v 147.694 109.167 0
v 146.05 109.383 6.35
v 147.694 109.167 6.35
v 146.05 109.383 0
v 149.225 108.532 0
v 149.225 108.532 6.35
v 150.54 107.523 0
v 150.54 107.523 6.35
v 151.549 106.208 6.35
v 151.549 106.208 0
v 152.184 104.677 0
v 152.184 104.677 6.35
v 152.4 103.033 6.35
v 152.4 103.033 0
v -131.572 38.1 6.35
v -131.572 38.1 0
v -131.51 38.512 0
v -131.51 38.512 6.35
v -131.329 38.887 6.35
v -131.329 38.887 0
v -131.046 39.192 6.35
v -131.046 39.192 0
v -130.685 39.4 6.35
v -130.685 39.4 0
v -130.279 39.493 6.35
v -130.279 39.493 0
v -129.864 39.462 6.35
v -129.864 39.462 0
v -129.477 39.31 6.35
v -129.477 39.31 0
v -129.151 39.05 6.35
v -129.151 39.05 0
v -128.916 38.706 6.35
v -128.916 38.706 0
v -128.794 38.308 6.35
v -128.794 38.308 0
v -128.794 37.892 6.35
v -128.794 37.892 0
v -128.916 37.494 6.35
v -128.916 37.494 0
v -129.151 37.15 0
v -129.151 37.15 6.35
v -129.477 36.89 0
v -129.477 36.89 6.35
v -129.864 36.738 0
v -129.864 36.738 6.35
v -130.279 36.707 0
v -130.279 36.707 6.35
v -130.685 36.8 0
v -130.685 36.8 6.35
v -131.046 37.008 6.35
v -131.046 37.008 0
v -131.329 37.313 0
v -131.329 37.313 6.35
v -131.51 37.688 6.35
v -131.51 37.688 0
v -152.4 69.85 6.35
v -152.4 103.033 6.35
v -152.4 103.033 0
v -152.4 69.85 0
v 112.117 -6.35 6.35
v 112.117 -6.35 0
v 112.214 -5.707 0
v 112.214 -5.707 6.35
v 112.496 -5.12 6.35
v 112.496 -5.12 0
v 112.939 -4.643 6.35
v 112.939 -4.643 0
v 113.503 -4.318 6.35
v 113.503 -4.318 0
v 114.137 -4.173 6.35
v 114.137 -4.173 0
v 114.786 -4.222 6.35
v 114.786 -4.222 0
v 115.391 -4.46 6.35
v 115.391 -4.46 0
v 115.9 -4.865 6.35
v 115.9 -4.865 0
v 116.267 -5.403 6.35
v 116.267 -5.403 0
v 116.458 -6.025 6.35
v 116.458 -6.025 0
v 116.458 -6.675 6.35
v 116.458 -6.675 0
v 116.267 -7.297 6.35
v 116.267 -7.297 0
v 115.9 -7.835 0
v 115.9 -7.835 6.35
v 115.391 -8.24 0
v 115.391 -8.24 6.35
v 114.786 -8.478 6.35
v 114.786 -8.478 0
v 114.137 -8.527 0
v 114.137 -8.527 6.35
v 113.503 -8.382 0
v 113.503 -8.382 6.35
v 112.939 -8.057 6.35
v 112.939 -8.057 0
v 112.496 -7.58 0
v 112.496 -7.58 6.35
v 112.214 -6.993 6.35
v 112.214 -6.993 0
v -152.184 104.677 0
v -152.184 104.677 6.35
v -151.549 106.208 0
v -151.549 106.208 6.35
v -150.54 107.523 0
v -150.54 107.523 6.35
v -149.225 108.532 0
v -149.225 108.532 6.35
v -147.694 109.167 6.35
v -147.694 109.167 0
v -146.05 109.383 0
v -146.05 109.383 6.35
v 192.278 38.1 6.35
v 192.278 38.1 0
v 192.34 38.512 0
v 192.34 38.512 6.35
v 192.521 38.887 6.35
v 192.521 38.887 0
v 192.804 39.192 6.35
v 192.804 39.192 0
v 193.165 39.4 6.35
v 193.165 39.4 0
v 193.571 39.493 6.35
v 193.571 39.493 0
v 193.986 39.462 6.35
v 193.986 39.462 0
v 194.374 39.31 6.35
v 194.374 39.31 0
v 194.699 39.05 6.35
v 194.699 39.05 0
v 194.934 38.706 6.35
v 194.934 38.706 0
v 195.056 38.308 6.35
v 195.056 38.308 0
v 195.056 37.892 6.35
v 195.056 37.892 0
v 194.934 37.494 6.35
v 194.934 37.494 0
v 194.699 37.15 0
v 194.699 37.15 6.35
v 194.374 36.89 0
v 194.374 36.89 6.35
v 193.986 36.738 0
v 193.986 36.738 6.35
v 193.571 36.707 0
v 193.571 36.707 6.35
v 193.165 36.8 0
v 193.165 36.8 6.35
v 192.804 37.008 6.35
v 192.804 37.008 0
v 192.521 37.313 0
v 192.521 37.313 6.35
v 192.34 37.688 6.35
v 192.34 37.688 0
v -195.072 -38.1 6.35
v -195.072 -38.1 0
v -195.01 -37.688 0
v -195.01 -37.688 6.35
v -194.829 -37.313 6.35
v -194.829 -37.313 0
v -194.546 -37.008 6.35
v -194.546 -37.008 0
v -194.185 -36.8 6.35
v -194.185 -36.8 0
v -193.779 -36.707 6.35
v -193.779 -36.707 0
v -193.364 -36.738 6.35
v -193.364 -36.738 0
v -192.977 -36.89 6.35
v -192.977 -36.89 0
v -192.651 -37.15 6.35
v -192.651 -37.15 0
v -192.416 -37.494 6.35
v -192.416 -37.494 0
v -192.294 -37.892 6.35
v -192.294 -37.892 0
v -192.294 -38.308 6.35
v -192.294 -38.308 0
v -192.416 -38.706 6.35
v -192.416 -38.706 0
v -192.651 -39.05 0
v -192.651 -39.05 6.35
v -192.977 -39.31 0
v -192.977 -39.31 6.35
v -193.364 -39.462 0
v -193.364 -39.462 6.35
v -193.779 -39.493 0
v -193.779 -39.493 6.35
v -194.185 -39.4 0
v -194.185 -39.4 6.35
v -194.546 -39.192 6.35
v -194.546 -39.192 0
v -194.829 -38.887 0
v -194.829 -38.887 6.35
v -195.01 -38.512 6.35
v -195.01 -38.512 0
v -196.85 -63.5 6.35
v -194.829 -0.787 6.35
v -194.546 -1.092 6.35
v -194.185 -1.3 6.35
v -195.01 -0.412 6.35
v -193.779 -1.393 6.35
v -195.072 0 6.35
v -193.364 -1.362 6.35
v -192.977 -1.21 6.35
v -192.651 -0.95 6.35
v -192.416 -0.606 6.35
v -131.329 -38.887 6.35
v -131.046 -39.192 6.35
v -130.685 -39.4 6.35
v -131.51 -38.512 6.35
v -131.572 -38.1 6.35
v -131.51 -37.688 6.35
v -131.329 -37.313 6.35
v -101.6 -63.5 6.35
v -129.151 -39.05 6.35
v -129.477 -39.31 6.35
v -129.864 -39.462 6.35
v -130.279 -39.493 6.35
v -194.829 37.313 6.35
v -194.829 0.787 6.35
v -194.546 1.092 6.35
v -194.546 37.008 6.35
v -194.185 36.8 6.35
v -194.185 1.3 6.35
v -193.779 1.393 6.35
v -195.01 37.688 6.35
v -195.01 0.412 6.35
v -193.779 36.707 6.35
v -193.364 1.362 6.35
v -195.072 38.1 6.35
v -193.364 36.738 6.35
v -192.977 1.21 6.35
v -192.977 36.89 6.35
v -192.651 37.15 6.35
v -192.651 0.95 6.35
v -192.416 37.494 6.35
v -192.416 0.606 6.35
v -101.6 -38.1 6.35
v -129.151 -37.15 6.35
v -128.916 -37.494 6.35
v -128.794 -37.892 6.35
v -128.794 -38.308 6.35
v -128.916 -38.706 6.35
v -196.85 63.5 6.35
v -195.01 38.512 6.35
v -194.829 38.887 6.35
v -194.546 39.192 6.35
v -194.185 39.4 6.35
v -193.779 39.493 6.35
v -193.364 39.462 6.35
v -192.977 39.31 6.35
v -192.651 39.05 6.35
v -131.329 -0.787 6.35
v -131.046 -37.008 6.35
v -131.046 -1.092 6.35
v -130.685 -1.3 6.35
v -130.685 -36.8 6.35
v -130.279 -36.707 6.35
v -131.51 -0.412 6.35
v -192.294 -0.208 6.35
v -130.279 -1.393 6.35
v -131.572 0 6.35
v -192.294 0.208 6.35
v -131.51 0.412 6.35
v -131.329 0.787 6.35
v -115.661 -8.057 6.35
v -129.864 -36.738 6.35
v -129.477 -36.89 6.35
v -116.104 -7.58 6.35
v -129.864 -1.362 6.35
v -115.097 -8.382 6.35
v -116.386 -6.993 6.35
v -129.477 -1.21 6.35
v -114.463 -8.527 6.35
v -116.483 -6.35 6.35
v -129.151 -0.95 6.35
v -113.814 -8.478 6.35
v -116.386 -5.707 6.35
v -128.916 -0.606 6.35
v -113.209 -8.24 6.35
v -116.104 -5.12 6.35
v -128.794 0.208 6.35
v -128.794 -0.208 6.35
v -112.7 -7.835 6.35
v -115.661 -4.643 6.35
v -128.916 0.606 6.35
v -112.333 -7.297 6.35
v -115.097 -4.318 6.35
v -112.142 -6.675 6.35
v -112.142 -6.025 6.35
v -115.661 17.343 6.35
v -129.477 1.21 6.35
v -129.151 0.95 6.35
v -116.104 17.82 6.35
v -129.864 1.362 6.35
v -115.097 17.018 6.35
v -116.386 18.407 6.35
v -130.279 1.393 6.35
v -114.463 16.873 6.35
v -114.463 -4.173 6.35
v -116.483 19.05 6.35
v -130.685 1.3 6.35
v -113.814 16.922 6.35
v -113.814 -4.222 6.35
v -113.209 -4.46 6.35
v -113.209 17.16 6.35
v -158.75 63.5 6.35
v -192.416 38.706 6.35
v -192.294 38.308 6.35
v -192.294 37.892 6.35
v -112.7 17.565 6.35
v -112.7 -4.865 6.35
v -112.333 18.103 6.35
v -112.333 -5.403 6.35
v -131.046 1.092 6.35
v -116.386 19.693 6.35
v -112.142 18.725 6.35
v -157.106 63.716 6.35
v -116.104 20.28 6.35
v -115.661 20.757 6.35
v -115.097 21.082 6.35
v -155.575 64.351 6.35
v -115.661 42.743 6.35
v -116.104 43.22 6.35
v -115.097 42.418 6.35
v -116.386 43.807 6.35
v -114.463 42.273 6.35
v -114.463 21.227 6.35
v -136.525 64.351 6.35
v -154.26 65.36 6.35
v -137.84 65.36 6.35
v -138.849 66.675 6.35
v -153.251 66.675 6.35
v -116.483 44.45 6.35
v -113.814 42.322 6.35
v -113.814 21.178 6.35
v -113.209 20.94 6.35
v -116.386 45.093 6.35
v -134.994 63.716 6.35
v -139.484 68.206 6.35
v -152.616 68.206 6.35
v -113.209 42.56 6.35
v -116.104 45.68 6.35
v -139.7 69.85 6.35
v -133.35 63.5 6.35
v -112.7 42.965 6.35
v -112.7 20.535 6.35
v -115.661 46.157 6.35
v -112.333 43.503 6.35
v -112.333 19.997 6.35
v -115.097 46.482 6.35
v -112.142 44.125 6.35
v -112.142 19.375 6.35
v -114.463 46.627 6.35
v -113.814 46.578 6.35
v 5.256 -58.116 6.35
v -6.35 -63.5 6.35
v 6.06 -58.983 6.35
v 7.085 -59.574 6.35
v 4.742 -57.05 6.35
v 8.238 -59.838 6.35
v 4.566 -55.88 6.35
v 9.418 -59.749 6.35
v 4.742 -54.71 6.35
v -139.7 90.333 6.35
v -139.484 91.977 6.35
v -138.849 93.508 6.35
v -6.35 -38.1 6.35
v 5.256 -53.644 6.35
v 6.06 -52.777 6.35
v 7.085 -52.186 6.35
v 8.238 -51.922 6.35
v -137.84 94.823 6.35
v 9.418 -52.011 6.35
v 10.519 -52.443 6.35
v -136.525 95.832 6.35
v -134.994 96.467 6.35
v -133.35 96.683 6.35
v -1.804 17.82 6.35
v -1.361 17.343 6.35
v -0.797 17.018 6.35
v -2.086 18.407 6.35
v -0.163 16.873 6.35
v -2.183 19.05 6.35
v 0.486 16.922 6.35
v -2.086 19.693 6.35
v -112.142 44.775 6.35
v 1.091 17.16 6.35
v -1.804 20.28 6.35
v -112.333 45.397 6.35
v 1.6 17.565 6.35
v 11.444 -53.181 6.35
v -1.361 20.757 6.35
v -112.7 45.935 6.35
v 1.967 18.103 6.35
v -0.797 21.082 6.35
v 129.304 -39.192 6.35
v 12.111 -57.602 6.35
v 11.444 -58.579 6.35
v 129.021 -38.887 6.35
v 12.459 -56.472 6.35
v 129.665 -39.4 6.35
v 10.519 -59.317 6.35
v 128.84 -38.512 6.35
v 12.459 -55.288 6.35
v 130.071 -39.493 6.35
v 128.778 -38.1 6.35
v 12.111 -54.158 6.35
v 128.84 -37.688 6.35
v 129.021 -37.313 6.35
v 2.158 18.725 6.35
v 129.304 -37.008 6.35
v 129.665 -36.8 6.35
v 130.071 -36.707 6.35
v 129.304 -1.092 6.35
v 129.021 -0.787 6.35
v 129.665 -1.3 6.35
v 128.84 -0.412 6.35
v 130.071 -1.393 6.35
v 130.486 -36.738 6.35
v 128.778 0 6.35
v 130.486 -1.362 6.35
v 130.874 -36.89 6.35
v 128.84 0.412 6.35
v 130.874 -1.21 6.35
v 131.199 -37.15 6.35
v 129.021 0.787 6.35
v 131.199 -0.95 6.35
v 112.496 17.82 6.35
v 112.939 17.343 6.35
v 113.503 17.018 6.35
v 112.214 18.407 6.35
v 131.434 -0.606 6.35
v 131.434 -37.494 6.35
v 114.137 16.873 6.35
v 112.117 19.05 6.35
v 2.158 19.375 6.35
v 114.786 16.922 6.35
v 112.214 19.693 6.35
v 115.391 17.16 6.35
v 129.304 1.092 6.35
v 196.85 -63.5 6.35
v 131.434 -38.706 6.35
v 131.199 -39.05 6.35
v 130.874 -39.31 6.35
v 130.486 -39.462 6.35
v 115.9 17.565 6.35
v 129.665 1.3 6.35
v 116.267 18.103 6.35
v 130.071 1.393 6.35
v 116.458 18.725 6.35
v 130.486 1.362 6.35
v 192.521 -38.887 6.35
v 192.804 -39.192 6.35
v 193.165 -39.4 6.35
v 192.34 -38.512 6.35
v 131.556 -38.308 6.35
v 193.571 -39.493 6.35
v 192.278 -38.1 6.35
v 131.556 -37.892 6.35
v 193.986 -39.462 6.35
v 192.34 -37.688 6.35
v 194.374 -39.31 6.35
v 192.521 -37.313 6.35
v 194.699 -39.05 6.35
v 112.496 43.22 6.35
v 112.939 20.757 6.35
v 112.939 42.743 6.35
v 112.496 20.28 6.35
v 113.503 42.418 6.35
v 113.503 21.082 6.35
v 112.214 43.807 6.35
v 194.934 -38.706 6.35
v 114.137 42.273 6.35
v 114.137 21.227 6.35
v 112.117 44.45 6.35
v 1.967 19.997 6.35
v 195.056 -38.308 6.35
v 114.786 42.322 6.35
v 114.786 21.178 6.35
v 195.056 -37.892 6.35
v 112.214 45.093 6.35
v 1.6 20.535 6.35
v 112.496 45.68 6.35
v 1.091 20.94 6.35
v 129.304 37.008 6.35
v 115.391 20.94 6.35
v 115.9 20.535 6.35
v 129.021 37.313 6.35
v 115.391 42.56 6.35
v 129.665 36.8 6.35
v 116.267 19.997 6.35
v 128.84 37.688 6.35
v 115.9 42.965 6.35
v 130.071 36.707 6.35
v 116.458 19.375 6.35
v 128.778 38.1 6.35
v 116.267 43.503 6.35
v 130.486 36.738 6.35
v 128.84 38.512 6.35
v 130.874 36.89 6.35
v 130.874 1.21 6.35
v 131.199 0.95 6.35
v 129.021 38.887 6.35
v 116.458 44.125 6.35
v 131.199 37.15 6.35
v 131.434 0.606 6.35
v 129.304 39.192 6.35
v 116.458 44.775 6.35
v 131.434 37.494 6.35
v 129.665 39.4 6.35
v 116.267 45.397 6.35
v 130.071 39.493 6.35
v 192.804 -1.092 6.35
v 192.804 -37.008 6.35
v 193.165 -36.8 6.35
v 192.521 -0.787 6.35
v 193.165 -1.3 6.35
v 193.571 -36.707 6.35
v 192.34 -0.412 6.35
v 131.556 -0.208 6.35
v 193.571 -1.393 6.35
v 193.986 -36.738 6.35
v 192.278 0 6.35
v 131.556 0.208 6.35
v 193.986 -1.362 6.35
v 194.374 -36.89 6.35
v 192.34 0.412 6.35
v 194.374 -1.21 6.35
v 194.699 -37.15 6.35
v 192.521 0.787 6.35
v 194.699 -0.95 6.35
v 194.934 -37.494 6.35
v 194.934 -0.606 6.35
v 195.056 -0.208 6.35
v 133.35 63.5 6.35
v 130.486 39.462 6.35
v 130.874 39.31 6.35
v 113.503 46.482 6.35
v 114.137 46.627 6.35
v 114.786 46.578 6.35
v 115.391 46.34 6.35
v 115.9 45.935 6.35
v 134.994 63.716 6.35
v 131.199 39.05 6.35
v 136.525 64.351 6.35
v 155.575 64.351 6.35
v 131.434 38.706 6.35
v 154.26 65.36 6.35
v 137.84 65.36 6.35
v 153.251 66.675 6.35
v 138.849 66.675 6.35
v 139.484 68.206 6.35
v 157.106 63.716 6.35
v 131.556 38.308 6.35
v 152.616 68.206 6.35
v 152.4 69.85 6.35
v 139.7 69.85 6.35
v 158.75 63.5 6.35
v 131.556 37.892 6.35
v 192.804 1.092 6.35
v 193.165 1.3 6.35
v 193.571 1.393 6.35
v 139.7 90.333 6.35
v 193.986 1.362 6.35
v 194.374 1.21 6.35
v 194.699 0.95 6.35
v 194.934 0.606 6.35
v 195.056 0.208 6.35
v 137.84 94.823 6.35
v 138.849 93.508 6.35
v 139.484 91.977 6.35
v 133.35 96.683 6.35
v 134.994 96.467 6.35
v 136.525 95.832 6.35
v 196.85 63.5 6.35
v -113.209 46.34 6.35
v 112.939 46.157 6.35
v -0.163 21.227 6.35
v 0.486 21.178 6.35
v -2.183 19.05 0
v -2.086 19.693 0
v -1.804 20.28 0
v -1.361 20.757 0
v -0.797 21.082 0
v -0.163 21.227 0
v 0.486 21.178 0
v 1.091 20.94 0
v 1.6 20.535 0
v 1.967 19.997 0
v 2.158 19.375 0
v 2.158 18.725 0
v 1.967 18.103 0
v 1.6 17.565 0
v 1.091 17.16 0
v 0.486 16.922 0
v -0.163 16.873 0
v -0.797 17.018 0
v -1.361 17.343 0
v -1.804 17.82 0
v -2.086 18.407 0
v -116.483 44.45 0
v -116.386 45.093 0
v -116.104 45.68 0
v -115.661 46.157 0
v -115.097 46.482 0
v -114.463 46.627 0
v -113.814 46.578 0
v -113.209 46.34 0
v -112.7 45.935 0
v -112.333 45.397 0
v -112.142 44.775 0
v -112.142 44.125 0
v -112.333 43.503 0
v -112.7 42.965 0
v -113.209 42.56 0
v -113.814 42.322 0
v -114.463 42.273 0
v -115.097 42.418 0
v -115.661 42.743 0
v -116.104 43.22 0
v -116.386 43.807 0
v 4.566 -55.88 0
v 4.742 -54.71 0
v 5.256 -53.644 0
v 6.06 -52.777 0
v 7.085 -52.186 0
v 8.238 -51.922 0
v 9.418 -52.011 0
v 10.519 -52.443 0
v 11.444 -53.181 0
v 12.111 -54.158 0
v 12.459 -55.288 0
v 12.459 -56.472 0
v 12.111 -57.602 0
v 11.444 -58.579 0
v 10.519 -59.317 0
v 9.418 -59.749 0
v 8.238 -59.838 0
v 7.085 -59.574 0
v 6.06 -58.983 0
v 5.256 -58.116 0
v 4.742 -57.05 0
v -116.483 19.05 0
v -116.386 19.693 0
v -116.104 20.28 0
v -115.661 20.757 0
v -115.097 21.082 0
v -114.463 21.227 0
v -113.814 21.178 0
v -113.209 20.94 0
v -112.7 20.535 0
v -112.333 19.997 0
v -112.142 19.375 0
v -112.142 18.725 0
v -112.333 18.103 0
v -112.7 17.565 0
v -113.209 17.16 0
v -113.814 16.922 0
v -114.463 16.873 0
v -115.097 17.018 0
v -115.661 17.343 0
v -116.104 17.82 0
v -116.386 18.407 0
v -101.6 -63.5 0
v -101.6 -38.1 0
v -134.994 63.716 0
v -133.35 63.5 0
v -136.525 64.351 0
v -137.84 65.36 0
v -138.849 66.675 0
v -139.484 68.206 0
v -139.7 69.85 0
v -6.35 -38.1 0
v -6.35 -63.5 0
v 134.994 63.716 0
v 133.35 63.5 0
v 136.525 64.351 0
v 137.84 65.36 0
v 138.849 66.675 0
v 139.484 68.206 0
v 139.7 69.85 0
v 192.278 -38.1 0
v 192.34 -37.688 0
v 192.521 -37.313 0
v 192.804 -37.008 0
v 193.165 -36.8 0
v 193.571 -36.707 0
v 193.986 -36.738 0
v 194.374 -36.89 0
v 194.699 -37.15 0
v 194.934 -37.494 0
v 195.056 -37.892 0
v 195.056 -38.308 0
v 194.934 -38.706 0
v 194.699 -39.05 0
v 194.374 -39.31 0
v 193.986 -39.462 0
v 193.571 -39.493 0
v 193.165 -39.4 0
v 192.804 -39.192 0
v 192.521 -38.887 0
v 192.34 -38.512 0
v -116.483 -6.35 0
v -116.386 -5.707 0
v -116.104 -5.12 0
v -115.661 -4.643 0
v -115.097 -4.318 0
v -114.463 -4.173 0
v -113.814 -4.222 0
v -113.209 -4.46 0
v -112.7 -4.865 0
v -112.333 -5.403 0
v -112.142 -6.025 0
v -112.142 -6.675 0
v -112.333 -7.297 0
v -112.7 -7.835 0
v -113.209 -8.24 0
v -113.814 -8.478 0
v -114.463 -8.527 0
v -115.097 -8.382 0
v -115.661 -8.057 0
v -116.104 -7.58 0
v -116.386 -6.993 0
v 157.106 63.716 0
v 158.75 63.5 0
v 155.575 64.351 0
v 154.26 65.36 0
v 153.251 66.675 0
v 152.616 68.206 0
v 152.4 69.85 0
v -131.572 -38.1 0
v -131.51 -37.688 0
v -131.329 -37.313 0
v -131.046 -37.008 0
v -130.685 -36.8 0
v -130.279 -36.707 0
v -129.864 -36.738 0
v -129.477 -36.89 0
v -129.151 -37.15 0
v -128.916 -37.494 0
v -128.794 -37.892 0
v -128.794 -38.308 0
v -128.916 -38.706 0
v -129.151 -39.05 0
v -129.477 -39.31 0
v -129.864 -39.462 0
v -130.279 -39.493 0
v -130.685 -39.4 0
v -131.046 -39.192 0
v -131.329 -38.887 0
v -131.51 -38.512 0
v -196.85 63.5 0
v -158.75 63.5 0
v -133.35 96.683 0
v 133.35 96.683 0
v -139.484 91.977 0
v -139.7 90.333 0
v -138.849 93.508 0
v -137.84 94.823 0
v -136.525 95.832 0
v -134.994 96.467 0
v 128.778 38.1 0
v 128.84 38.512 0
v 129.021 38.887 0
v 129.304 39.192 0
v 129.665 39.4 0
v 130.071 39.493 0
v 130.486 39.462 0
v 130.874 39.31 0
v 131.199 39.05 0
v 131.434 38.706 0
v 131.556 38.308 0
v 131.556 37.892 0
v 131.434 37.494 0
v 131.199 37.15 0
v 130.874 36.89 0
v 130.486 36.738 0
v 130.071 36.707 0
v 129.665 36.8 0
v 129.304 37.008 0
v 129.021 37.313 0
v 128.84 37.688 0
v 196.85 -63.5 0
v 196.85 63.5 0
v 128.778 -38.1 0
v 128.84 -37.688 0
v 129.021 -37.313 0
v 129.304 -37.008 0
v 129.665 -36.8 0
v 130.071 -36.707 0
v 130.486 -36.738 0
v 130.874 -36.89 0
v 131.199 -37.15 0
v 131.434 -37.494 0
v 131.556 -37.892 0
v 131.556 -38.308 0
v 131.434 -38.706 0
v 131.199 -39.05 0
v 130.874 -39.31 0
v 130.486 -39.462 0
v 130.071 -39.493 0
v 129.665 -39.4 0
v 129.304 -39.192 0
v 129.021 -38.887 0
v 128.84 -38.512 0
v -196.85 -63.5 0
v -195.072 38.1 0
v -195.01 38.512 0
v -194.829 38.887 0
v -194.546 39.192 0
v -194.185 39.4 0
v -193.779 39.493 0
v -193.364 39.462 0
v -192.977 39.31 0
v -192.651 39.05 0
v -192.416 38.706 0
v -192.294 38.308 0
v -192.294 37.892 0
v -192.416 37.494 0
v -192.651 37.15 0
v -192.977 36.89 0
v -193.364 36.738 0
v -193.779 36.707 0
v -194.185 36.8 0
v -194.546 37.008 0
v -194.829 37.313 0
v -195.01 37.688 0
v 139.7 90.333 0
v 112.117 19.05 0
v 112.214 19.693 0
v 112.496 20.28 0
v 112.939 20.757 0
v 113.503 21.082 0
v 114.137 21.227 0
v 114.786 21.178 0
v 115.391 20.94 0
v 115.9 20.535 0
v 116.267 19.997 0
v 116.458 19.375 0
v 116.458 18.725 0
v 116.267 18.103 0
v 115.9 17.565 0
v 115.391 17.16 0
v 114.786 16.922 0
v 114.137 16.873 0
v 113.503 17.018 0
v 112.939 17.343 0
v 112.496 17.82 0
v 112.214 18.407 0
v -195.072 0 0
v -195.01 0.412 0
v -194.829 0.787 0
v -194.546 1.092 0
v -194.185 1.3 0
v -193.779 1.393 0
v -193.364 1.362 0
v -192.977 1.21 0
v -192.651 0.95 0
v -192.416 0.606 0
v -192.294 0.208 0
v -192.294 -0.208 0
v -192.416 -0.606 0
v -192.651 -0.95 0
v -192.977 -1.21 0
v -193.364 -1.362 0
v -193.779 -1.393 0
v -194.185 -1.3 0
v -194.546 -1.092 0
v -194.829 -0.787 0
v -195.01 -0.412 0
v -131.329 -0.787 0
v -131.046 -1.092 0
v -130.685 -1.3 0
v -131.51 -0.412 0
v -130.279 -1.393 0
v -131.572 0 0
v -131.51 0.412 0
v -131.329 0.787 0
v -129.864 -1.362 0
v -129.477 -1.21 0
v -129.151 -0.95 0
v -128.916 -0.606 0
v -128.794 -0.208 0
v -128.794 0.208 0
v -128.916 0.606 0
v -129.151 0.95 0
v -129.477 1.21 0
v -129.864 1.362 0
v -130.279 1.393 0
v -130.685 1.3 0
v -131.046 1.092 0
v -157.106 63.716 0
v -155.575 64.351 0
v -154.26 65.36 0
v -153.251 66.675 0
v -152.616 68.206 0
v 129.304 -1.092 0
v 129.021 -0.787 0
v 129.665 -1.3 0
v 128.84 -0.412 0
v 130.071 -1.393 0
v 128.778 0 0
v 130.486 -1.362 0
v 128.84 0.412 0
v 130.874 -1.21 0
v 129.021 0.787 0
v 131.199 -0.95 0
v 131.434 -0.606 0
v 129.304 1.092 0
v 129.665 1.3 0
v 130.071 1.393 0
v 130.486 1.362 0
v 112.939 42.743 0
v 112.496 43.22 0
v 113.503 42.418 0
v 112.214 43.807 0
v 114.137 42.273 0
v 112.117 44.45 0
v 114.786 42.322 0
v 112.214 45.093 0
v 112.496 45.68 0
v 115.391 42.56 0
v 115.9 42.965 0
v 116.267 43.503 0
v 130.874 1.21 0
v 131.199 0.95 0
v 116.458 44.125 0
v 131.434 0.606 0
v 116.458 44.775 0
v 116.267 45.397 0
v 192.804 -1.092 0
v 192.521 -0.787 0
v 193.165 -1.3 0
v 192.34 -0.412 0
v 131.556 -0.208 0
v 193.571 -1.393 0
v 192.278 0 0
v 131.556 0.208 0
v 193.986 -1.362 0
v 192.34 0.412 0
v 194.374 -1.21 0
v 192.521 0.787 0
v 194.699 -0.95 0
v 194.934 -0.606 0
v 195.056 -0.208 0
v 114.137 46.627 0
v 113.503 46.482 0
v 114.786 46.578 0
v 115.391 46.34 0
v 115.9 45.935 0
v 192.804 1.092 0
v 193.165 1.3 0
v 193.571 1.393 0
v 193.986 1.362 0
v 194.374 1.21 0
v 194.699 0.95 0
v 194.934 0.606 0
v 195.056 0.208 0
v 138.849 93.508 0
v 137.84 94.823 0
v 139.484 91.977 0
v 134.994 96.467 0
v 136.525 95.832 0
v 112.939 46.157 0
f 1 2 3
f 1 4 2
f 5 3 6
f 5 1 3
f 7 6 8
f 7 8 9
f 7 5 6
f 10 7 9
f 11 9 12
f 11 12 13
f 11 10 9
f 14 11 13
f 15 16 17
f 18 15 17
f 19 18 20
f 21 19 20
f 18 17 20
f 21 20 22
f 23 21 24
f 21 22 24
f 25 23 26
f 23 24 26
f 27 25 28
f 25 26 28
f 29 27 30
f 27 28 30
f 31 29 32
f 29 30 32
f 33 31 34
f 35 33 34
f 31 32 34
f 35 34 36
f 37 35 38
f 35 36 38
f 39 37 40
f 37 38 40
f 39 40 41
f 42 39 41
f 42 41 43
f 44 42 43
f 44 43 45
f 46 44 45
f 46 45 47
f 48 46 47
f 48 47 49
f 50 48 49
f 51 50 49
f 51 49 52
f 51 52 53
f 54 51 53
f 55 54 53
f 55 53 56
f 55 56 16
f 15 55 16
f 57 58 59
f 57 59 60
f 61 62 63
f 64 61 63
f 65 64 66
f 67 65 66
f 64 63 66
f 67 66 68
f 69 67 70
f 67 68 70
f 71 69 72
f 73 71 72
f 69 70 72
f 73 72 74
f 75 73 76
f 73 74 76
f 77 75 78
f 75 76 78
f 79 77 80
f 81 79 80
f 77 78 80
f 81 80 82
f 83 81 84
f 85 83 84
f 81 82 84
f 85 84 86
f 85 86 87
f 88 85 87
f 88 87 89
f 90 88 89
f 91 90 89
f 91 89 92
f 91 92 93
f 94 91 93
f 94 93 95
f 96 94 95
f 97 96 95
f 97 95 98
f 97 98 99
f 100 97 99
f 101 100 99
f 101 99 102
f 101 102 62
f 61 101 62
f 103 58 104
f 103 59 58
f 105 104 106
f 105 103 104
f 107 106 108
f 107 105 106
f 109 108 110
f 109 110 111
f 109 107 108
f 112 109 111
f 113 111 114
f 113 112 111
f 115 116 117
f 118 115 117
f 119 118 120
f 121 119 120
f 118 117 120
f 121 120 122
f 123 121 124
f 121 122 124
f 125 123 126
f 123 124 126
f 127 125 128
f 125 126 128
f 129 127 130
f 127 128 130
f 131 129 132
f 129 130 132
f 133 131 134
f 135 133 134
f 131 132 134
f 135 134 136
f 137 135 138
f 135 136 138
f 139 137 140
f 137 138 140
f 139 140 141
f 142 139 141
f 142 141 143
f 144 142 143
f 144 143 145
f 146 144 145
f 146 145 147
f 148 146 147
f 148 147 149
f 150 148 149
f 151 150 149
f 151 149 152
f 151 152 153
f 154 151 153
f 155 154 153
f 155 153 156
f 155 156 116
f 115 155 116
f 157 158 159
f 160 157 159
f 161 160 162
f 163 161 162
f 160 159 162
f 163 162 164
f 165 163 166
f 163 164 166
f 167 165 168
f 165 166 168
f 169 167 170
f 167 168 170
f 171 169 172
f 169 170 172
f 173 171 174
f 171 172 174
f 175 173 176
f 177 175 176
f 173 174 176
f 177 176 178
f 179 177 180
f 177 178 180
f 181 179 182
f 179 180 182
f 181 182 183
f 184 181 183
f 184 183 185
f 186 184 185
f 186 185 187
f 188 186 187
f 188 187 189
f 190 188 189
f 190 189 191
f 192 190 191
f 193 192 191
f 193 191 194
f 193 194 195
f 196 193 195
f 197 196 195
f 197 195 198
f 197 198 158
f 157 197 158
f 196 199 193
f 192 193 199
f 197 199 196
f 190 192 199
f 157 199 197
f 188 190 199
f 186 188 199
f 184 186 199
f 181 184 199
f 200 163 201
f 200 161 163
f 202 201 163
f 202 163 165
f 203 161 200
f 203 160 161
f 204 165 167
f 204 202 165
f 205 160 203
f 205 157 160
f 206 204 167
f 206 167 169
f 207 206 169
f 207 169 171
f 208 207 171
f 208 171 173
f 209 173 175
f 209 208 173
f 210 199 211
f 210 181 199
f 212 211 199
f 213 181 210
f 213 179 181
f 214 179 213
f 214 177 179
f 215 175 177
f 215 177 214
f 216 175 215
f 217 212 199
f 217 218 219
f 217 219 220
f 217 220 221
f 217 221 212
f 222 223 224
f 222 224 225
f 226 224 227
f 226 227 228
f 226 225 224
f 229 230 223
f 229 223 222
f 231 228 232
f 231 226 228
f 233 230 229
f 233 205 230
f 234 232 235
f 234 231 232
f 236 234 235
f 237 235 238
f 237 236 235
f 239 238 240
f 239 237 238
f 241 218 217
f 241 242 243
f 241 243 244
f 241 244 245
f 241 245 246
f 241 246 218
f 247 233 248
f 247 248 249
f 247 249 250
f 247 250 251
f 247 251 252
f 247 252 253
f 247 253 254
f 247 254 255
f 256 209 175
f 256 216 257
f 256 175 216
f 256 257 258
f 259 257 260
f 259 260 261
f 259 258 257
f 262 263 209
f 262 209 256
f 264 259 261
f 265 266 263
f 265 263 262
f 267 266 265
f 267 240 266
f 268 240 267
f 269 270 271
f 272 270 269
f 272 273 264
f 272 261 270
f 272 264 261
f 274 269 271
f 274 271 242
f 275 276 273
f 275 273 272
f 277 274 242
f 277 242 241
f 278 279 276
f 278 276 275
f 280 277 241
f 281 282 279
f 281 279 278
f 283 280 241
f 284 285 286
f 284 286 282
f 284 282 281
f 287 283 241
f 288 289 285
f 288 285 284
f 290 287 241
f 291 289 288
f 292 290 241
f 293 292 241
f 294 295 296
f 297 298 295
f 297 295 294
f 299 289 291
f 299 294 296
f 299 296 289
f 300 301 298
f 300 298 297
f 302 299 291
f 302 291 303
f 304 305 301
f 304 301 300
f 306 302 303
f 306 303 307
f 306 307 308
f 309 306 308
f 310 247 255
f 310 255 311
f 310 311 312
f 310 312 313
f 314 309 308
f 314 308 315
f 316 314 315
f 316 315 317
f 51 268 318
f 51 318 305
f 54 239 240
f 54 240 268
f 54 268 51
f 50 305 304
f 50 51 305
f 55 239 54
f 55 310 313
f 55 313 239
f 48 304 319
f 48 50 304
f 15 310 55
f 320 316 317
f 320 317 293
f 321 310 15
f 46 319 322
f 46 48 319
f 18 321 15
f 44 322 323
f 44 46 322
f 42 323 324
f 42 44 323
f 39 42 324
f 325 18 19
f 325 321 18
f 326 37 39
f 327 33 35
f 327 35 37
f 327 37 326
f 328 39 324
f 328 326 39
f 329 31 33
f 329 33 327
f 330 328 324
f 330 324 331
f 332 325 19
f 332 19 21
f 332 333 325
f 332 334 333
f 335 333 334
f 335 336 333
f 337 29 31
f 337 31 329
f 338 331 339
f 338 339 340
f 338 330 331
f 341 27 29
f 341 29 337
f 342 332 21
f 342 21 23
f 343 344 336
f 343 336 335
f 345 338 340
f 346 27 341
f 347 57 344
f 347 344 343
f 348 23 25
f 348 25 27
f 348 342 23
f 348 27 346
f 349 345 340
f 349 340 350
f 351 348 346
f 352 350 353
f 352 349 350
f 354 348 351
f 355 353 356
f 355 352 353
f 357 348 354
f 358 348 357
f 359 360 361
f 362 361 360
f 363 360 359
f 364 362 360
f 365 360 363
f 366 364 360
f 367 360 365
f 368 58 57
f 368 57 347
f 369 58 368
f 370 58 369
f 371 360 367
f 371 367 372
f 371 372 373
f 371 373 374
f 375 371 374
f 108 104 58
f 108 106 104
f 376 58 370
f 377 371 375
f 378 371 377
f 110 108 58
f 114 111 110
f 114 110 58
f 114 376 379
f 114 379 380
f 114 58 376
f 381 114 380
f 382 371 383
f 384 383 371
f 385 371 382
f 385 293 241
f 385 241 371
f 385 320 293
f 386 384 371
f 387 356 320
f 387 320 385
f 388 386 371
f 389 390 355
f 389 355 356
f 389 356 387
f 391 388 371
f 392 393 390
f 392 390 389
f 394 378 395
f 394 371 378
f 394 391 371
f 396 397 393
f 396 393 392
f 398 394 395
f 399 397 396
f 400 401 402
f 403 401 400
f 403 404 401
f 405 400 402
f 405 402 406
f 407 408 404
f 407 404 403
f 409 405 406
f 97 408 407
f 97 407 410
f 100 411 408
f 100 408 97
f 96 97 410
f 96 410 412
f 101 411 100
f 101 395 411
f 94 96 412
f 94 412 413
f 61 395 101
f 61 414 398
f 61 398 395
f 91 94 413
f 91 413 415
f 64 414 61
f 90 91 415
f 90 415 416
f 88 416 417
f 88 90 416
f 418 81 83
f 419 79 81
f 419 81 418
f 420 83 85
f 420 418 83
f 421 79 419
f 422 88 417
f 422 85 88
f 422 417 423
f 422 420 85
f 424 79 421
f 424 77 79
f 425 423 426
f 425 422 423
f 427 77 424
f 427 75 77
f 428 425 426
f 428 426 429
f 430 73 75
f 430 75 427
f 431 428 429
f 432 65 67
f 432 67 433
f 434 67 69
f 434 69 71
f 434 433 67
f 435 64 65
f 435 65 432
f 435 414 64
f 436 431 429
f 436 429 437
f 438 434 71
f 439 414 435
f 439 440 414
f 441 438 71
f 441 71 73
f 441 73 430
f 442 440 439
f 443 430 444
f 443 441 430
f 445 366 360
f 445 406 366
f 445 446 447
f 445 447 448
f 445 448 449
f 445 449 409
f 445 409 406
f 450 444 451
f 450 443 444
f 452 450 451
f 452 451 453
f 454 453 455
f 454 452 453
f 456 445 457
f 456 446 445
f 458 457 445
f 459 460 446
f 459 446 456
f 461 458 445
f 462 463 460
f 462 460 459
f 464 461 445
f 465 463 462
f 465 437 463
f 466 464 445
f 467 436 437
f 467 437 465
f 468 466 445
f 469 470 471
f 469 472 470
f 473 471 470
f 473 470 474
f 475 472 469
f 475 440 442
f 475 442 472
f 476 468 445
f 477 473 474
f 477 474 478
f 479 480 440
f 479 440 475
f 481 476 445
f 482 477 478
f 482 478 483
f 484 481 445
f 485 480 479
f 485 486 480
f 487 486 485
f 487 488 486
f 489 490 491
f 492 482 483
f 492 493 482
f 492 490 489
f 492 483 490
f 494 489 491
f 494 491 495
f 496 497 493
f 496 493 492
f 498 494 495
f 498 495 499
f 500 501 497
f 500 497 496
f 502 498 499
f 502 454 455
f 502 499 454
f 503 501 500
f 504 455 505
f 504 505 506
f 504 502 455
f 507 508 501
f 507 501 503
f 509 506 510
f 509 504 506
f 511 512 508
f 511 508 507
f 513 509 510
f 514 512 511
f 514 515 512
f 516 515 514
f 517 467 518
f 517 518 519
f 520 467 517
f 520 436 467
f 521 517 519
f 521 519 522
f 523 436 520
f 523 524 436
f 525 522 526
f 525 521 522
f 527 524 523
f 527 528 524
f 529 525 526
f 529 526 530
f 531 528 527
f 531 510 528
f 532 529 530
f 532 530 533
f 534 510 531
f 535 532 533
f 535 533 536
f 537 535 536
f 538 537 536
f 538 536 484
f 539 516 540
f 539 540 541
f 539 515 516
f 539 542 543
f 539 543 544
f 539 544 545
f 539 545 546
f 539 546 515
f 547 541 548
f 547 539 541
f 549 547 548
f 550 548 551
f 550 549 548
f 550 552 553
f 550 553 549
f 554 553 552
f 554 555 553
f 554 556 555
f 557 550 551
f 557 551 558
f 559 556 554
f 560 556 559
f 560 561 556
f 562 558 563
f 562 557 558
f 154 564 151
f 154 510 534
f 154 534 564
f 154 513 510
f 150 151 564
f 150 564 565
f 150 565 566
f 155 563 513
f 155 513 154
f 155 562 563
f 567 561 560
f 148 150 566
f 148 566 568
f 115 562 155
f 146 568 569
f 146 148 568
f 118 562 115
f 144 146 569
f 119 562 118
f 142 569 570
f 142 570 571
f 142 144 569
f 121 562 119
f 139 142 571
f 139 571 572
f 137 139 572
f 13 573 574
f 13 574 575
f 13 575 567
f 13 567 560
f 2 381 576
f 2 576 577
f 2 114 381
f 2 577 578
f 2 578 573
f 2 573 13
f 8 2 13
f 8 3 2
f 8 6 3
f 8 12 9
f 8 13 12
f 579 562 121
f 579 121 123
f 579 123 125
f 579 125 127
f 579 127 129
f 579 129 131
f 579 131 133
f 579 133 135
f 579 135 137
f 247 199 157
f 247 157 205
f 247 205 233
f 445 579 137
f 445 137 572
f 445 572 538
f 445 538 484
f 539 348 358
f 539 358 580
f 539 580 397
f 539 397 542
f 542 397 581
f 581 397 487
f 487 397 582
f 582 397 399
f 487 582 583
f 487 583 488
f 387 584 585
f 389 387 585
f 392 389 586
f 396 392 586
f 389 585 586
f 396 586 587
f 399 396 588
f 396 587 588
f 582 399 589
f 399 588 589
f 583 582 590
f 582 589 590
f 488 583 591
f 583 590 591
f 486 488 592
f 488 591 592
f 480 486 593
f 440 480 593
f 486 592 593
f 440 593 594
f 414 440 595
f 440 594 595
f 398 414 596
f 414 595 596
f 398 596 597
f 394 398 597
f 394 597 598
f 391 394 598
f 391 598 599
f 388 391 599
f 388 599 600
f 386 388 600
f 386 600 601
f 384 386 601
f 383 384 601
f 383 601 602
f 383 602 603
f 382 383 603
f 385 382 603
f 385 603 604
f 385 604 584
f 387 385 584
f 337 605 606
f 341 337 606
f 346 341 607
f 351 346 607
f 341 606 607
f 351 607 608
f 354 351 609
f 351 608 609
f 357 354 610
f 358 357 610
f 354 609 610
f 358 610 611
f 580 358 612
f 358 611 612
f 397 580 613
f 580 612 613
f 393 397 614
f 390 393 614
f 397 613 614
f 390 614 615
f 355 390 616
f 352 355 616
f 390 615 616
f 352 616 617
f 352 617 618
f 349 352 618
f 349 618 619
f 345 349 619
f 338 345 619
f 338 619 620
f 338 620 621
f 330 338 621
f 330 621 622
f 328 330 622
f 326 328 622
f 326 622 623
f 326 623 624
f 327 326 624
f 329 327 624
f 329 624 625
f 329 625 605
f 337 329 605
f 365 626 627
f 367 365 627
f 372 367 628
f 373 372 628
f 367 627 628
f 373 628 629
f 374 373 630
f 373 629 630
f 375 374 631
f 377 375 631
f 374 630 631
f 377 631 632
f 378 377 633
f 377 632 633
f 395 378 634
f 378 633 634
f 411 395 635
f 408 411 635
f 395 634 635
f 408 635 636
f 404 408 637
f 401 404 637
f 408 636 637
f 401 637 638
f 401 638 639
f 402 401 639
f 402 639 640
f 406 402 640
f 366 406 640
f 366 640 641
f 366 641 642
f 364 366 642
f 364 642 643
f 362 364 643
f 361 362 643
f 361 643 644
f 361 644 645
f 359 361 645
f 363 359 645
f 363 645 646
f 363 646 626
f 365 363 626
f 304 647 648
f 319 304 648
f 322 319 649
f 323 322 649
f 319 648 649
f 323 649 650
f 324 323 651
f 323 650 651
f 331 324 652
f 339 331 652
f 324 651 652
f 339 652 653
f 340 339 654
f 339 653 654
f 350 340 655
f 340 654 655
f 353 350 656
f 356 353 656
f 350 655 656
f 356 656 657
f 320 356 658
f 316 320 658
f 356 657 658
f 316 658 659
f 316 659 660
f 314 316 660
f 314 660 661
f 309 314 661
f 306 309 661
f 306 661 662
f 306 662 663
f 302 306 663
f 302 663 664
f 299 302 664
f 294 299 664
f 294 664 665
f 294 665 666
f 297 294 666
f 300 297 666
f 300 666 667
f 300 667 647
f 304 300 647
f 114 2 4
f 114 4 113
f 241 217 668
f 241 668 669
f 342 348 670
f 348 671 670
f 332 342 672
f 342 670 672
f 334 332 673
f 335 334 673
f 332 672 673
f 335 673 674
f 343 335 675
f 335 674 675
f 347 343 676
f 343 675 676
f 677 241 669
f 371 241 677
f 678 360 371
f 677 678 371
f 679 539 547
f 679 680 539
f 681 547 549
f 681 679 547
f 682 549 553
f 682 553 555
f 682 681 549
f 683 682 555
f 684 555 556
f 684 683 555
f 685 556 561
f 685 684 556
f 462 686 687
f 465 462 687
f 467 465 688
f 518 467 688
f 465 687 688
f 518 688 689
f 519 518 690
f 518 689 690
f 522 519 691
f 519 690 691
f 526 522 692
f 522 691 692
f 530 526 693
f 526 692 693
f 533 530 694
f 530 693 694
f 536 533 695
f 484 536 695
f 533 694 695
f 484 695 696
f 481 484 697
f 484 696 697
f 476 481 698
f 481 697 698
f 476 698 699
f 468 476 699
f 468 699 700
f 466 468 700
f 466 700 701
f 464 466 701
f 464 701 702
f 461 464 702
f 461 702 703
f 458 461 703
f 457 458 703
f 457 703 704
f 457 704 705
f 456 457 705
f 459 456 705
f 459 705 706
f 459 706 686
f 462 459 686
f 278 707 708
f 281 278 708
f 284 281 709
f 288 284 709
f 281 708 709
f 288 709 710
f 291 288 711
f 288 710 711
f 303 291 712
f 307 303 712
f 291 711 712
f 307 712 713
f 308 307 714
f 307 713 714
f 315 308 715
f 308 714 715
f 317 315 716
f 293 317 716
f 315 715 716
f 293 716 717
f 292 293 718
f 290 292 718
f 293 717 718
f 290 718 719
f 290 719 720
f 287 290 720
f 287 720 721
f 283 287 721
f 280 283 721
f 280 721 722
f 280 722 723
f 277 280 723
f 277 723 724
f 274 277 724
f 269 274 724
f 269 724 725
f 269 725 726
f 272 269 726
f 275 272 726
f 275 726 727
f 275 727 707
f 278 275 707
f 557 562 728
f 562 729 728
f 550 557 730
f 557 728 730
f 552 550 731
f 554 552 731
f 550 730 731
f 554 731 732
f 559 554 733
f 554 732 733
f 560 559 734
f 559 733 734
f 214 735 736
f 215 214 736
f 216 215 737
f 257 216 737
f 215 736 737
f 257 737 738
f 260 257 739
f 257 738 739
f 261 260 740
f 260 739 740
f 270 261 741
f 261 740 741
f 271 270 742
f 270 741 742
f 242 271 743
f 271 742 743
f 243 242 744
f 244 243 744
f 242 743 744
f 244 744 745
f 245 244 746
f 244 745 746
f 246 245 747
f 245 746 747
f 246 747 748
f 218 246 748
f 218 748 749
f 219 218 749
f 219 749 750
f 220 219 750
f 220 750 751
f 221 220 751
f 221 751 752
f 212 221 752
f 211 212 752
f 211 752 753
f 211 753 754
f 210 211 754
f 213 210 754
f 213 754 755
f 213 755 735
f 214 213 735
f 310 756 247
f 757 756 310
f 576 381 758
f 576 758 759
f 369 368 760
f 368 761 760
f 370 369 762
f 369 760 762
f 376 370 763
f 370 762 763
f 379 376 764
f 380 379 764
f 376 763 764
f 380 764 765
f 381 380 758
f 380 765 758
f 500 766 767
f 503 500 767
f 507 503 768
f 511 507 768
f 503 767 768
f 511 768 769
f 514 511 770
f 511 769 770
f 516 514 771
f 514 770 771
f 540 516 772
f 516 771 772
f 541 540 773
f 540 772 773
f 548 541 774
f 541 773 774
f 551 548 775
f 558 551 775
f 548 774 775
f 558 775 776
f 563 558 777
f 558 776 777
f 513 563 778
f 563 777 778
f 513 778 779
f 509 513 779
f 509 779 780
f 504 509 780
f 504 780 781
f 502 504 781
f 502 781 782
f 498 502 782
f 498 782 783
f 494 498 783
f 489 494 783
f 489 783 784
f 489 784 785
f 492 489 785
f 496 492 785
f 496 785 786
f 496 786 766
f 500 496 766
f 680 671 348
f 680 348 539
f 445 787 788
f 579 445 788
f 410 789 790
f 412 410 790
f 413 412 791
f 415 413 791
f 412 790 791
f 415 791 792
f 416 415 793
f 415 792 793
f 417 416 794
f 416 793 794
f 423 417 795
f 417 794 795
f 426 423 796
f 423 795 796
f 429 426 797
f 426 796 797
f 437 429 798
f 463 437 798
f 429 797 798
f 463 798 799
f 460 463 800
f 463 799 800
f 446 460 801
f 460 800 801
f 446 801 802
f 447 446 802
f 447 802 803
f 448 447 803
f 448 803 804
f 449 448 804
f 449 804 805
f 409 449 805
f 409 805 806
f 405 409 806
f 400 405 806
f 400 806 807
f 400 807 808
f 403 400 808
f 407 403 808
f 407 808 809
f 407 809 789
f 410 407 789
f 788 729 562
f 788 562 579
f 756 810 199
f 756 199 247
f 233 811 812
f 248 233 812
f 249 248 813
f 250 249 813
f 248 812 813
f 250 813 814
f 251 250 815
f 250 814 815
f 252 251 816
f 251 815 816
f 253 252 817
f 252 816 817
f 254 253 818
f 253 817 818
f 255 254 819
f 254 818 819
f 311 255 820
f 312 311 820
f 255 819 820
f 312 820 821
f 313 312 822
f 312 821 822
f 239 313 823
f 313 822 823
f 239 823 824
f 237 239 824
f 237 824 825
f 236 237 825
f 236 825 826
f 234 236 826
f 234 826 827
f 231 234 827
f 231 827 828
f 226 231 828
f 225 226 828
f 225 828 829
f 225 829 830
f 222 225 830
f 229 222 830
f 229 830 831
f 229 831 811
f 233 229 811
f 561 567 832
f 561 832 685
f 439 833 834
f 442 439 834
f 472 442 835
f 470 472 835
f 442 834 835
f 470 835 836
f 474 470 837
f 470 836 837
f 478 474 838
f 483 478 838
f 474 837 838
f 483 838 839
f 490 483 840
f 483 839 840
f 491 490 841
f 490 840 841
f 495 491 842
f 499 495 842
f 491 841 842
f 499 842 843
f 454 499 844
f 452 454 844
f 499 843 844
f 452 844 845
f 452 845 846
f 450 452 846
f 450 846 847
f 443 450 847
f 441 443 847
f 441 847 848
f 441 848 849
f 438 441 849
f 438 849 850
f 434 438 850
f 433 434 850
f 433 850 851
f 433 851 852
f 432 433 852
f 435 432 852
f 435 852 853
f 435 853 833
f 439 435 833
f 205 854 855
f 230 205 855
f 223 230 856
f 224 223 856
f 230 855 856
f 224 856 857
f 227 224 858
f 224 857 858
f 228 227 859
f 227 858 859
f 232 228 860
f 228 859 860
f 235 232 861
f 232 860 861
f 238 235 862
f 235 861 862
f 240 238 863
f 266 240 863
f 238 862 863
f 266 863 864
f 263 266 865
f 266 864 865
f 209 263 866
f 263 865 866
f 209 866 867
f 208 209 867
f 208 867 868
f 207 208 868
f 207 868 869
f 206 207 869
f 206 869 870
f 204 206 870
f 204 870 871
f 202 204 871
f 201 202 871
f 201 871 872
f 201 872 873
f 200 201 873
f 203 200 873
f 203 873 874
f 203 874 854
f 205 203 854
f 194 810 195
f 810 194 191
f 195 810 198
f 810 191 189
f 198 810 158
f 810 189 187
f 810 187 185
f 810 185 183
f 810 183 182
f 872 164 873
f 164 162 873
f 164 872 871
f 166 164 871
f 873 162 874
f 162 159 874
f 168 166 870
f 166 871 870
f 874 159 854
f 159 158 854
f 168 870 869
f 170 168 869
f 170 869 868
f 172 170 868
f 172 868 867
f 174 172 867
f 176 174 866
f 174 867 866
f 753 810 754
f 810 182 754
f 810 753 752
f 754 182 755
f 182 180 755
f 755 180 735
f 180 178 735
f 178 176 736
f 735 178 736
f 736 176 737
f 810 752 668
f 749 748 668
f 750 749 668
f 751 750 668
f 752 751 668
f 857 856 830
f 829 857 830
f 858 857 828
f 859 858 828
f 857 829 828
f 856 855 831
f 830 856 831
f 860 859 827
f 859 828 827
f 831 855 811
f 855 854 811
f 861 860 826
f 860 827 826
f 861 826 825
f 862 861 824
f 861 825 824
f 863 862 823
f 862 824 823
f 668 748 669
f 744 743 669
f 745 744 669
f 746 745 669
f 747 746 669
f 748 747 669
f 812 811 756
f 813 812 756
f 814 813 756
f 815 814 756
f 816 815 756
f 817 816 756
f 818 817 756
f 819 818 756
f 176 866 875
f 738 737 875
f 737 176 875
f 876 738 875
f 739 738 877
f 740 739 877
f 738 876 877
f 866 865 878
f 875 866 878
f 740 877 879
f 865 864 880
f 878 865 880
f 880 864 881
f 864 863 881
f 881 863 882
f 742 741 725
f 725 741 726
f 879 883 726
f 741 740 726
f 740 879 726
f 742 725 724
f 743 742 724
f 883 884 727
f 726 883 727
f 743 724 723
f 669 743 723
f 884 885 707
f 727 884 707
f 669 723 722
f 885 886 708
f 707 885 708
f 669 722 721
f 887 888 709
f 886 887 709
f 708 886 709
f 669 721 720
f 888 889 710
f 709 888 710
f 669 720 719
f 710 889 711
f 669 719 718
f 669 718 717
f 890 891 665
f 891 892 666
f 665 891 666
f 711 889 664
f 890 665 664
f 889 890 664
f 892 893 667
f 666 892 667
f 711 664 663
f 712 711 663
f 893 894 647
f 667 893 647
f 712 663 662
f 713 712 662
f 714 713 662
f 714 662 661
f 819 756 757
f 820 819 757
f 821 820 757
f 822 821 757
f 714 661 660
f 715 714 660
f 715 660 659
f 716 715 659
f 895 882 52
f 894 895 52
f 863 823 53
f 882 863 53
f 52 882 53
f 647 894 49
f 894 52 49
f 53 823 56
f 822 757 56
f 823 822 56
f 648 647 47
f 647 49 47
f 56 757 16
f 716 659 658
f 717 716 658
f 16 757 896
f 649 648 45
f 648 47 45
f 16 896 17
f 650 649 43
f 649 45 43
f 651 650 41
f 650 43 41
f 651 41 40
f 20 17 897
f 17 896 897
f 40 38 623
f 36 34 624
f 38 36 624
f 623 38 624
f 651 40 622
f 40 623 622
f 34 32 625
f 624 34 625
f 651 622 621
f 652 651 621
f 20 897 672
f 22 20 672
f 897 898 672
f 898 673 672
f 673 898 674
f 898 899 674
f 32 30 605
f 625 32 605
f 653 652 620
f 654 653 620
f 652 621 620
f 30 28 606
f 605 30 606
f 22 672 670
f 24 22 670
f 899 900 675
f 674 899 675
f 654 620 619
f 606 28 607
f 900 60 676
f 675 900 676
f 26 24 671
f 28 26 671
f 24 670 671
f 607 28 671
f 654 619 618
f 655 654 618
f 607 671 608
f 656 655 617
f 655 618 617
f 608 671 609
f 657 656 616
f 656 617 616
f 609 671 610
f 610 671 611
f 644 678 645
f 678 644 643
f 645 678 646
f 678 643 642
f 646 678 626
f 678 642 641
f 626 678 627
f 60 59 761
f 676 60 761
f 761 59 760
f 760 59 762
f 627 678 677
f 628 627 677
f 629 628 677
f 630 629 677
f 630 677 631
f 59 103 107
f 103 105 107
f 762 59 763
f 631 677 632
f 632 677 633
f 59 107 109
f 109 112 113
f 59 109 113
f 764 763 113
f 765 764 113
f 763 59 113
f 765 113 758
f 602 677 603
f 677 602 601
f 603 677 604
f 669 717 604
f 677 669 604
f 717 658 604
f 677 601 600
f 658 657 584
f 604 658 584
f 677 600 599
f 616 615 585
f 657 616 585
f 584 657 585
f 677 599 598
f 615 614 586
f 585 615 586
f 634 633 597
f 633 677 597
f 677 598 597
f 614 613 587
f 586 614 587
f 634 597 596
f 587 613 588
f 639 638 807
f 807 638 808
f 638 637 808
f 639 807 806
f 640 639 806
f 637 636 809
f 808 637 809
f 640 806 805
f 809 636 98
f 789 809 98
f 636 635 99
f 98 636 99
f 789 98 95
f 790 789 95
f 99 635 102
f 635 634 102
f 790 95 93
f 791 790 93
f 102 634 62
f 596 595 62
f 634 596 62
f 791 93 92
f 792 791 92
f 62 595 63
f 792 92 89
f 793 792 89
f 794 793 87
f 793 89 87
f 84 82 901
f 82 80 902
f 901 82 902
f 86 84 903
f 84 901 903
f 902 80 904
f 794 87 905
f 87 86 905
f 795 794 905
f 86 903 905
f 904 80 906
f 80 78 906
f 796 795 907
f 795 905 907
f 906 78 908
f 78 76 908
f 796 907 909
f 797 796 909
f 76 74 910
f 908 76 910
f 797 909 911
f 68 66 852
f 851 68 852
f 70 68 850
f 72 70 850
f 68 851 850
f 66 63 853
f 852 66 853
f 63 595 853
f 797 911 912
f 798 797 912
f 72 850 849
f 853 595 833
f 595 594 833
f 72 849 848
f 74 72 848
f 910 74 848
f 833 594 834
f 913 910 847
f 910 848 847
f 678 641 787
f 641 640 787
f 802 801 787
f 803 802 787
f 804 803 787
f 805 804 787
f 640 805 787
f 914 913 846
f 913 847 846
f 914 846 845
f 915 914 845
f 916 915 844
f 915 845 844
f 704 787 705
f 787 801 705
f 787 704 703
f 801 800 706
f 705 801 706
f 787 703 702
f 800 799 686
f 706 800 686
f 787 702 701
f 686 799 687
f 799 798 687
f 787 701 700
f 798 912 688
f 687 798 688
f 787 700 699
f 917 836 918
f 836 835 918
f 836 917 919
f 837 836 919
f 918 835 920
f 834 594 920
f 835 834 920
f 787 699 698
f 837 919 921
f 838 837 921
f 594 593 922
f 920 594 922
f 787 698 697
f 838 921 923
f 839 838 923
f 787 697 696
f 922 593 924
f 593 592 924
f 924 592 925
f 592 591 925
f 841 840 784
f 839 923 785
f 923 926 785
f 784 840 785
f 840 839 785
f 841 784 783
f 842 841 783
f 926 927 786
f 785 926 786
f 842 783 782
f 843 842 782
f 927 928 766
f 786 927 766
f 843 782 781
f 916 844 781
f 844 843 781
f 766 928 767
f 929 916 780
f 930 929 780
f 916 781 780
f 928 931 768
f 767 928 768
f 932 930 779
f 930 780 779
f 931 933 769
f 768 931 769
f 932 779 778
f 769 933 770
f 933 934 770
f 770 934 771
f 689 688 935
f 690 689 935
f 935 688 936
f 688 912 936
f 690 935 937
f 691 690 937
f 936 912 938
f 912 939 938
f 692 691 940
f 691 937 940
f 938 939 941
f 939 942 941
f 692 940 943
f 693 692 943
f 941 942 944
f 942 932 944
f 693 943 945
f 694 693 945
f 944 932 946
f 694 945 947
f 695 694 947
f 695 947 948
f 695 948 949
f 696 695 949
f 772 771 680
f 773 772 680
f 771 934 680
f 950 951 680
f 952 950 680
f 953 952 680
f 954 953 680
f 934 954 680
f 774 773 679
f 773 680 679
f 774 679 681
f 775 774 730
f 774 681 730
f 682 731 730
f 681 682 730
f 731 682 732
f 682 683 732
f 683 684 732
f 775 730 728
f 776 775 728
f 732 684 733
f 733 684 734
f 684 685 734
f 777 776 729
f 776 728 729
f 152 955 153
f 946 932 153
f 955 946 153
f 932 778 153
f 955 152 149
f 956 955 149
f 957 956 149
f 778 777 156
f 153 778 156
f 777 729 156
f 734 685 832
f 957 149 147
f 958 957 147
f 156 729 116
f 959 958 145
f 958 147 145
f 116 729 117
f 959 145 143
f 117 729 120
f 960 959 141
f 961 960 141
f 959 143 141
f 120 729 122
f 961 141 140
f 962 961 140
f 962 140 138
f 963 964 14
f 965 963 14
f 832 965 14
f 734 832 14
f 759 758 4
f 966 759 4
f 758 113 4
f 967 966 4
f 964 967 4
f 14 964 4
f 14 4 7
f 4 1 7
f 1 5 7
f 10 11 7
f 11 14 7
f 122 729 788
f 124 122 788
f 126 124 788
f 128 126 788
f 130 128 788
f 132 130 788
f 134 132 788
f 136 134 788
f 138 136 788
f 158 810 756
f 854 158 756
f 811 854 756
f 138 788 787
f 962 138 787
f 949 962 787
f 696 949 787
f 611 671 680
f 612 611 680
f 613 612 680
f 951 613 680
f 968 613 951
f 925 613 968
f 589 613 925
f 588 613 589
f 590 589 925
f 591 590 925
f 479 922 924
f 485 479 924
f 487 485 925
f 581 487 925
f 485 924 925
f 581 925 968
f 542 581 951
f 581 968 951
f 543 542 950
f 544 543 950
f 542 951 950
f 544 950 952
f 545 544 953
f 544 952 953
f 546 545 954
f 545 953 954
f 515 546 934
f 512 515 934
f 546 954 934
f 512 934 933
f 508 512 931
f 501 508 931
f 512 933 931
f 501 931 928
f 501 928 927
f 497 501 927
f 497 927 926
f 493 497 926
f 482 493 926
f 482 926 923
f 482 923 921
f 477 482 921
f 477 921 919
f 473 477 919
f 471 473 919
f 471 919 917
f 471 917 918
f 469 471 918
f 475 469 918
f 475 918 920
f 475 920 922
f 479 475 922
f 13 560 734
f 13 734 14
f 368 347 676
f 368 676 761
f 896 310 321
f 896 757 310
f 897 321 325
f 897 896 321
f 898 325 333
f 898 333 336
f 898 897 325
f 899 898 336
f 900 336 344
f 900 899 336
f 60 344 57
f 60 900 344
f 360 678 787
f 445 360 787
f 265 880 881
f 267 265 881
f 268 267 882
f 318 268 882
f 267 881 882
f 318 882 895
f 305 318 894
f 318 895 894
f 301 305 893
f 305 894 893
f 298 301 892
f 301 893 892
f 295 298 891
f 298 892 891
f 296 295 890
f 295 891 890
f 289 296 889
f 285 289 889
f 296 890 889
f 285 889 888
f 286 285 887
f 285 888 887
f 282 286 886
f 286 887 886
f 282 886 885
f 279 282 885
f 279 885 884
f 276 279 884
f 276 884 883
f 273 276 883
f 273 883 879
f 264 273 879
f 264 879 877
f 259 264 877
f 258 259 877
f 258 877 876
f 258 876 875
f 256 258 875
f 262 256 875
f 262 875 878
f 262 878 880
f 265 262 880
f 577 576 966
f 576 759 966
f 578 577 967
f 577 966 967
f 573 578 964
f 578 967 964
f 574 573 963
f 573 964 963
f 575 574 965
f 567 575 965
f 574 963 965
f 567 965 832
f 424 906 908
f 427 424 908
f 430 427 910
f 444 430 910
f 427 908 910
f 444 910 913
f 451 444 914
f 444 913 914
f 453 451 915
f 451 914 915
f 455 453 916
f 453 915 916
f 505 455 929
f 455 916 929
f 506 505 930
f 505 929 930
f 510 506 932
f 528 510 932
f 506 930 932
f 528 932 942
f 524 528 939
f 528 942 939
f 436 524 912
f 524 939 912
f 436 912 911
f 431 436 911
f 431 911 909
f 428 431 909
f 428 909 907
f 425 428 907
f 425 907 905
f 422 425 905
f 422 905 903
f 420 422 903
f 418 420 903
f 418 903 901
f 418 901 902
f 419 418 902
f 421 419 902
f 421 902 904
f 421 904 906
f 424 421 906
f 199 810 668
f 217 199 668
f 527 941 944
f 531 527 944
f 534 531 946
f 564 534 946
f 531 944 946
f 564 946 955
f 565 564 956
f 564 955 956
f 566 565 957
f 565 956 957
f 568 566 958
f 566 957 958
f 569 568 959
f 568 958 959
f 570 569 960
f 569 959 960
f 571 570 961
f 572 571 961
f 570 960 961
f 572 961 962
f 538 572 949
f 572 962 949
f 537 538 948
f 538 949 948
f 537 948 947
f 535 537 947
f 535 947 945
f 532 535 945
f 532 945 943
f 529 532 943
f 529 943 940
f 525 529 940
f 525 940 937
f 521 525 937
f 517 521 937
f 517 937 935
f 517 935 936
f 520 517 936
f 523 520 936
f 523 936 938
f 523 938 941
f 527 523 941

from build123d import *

# Parameters (mm, degrees)
SKETCH1_W                            = 393.7
SKETCH1_H                            = 127
BOSS_EXTRUDE1_DEPTH                  = 6.35
BOSS_EXTRUDE2_DEPTH                  = 6.35
FILLET1_R                            = 6.35
SKETCH11_W                           = 95.25
SKETCH11_H                           = 25.4
CUT_EXTRUDE1_DEPTH                   = 226.28847424
F_5_16_0_3125_DIAMETER_HOLE1_D       = 7.9375
F_11_64_0_17188_DIAMETER_HOLE1_D     = 4.365752
F_35_0_11_DIAMETER_HOLE1_D           = 2.794
F_35_0_11_DIAMETER_HOLE1_DEPTH       = 8.89
F_35_0_11_DIAMETER_HOLE1_TIP         = 0.839402285
F_11_64_0_17188_DIAMETER_HOLE2_D     = 4.365752
F_11_64_0_17188_DIAMETER_HOLE2_DEPTH = 8.89
F_11_64_0_17188_DIAMETER_HOLE2_TIP   = 1.311604225


with BuildPart() as part:
    # Sketch1 → Boss-Extrude1 (new body)
    with BuildSketch(Plane.XY):
        Rectangle(SKETCH1_W, SKETCH1_H)
    extrude(amount=BOSS_EXTRUDE1_DEPTH)

    # Sketch10 → Boss-Extrude2 (add)
    with BuildSketch(Plane.XY.offset(6.35)):
        Polygon((-152.4, 96.68304999), (-152.4, 63.5), (-139.7, 63.5), (-139.7, 96.68304999), (0, 96.68304999), (0, 109.38304999), (-146.05, 109.38304999), (-152.4, 109.38304999), align=None)
        Polygon((139.7, 96.68304999), (139.7, 63.5), (152.4, 63.5), (152.4, 109.38304999), (0, 109.38304999), (0, 96.68304999), align=None)
    extrude(amount=-BOSS_EXTRUDE2_DEPTH)

    # Fillet1
    fillet1_edges = [part.edges().sort_by_distance(p)[0] for p in [
        (139.7, 96.68304999, 3.175),
        (-139.7, 96.68304999, 3.175),
        (-139.7, 63.5, 3.175),
        (-152.4, 63.5, 3.175),
        (-152.4, 109.38304999, 3.175),
        (152.4, 109.38304999, 3.175),
        (152.4, 63.5, 3.175),
        (139.7, 63.5, 3.175),
    ]]
    fillet(fillet1_edges, radius=FILLET1_R)

    # Sketch11 → Cut-Extrude1 (cut, through all)
    with BuildSketch(Plane.XY.offset(6.35)):
        with Locations((-53.975, -50.8)):
            Rectangle(SKETCH11_W, SKETCH11_H)
    extrude(amount=-CUT_EXTRUDE1_DEPTH, mode=Mode.SUBTRACT)

    # 5/16 (0.3125) Diameter Hole1 (through all)
    with Locations(Plane.XY.offset(6.35)):
        with Locations((8.534908, -55.88)):
            Hole(F_5_16_0_3125_DIAMETER_HOLE1_D / 2)

    # 11/64 (0.17188) Diameter Hole1 (through all)
    with Locations(Plane.XY.offset(6.35)):
        with Locations((-114.3, 44.45), (-114.3, 19.05), (-114.3, -6.35), (114.3, 44.45), (114.3, 19.05), (114.3, -6.35)):
            Hole(F_11_64_0_17188_DIAMETER_HOLE1_D / 2)

    # #35 (0.11) Diameter Hole1
    with Locations(Plane.XY.offset(6.35)):
        with Locations((-193.675, 38.1), (-130.175, 38.1), (-130.175, 0), (-193.675, 0), (-193.675, -38.1), (-130.175, -38.1), (130.175, -38.1), (193.675, -38.1), (193.675, 0), (193.675, 38.1), (130.175, 38.1), (130.175, 0)):
            Hole(F_35_0_11_DIAMETER_HOLE1_D / 2, depth=F_35_0_11_DIAMETER_HOLE1_DEPTH)
            with Locations((0, 0, -(F_35_0_11_DIAMETER_HOLE1_DEPTH + F_35_0_11_DIAMETER_HOLE1_TIP / 2))):  # 118° drill point
                Cone(0, F_35_0_11_DIAMETER_HOLE1_D / 2, F_35_0_11_DIAMETER_HOLE1_TIP, mode=Mode.SUBTRACT)

    # 11/64 (0.17188) Diameter Hole2
    with Locations(Plane.XY.offset(6.35)):
        with Locations((0, 19.05)):
            Hole(F_11_64_0_17188_DIAMETER_HOLE2_D / 2, depth=F_11_64_0_17188_DIAMETER_HOLE2_DEPTH)
            with Locations((0, 0, -(F_11_64_0_17188_DIAMETER_HOLE2_DEPTH + F_11_64_0_17188_DIAMETER_HOLE2_TIP / 2))):  # 118° drill point
                Cone(0, F_11_64_0_17188_DIAMETER_HOLE2_D / 2, F_11_64_0_17188_DIAMETER_HOLE2_TIP, mode=Mode.SUBTRACT)


solid = part.part
